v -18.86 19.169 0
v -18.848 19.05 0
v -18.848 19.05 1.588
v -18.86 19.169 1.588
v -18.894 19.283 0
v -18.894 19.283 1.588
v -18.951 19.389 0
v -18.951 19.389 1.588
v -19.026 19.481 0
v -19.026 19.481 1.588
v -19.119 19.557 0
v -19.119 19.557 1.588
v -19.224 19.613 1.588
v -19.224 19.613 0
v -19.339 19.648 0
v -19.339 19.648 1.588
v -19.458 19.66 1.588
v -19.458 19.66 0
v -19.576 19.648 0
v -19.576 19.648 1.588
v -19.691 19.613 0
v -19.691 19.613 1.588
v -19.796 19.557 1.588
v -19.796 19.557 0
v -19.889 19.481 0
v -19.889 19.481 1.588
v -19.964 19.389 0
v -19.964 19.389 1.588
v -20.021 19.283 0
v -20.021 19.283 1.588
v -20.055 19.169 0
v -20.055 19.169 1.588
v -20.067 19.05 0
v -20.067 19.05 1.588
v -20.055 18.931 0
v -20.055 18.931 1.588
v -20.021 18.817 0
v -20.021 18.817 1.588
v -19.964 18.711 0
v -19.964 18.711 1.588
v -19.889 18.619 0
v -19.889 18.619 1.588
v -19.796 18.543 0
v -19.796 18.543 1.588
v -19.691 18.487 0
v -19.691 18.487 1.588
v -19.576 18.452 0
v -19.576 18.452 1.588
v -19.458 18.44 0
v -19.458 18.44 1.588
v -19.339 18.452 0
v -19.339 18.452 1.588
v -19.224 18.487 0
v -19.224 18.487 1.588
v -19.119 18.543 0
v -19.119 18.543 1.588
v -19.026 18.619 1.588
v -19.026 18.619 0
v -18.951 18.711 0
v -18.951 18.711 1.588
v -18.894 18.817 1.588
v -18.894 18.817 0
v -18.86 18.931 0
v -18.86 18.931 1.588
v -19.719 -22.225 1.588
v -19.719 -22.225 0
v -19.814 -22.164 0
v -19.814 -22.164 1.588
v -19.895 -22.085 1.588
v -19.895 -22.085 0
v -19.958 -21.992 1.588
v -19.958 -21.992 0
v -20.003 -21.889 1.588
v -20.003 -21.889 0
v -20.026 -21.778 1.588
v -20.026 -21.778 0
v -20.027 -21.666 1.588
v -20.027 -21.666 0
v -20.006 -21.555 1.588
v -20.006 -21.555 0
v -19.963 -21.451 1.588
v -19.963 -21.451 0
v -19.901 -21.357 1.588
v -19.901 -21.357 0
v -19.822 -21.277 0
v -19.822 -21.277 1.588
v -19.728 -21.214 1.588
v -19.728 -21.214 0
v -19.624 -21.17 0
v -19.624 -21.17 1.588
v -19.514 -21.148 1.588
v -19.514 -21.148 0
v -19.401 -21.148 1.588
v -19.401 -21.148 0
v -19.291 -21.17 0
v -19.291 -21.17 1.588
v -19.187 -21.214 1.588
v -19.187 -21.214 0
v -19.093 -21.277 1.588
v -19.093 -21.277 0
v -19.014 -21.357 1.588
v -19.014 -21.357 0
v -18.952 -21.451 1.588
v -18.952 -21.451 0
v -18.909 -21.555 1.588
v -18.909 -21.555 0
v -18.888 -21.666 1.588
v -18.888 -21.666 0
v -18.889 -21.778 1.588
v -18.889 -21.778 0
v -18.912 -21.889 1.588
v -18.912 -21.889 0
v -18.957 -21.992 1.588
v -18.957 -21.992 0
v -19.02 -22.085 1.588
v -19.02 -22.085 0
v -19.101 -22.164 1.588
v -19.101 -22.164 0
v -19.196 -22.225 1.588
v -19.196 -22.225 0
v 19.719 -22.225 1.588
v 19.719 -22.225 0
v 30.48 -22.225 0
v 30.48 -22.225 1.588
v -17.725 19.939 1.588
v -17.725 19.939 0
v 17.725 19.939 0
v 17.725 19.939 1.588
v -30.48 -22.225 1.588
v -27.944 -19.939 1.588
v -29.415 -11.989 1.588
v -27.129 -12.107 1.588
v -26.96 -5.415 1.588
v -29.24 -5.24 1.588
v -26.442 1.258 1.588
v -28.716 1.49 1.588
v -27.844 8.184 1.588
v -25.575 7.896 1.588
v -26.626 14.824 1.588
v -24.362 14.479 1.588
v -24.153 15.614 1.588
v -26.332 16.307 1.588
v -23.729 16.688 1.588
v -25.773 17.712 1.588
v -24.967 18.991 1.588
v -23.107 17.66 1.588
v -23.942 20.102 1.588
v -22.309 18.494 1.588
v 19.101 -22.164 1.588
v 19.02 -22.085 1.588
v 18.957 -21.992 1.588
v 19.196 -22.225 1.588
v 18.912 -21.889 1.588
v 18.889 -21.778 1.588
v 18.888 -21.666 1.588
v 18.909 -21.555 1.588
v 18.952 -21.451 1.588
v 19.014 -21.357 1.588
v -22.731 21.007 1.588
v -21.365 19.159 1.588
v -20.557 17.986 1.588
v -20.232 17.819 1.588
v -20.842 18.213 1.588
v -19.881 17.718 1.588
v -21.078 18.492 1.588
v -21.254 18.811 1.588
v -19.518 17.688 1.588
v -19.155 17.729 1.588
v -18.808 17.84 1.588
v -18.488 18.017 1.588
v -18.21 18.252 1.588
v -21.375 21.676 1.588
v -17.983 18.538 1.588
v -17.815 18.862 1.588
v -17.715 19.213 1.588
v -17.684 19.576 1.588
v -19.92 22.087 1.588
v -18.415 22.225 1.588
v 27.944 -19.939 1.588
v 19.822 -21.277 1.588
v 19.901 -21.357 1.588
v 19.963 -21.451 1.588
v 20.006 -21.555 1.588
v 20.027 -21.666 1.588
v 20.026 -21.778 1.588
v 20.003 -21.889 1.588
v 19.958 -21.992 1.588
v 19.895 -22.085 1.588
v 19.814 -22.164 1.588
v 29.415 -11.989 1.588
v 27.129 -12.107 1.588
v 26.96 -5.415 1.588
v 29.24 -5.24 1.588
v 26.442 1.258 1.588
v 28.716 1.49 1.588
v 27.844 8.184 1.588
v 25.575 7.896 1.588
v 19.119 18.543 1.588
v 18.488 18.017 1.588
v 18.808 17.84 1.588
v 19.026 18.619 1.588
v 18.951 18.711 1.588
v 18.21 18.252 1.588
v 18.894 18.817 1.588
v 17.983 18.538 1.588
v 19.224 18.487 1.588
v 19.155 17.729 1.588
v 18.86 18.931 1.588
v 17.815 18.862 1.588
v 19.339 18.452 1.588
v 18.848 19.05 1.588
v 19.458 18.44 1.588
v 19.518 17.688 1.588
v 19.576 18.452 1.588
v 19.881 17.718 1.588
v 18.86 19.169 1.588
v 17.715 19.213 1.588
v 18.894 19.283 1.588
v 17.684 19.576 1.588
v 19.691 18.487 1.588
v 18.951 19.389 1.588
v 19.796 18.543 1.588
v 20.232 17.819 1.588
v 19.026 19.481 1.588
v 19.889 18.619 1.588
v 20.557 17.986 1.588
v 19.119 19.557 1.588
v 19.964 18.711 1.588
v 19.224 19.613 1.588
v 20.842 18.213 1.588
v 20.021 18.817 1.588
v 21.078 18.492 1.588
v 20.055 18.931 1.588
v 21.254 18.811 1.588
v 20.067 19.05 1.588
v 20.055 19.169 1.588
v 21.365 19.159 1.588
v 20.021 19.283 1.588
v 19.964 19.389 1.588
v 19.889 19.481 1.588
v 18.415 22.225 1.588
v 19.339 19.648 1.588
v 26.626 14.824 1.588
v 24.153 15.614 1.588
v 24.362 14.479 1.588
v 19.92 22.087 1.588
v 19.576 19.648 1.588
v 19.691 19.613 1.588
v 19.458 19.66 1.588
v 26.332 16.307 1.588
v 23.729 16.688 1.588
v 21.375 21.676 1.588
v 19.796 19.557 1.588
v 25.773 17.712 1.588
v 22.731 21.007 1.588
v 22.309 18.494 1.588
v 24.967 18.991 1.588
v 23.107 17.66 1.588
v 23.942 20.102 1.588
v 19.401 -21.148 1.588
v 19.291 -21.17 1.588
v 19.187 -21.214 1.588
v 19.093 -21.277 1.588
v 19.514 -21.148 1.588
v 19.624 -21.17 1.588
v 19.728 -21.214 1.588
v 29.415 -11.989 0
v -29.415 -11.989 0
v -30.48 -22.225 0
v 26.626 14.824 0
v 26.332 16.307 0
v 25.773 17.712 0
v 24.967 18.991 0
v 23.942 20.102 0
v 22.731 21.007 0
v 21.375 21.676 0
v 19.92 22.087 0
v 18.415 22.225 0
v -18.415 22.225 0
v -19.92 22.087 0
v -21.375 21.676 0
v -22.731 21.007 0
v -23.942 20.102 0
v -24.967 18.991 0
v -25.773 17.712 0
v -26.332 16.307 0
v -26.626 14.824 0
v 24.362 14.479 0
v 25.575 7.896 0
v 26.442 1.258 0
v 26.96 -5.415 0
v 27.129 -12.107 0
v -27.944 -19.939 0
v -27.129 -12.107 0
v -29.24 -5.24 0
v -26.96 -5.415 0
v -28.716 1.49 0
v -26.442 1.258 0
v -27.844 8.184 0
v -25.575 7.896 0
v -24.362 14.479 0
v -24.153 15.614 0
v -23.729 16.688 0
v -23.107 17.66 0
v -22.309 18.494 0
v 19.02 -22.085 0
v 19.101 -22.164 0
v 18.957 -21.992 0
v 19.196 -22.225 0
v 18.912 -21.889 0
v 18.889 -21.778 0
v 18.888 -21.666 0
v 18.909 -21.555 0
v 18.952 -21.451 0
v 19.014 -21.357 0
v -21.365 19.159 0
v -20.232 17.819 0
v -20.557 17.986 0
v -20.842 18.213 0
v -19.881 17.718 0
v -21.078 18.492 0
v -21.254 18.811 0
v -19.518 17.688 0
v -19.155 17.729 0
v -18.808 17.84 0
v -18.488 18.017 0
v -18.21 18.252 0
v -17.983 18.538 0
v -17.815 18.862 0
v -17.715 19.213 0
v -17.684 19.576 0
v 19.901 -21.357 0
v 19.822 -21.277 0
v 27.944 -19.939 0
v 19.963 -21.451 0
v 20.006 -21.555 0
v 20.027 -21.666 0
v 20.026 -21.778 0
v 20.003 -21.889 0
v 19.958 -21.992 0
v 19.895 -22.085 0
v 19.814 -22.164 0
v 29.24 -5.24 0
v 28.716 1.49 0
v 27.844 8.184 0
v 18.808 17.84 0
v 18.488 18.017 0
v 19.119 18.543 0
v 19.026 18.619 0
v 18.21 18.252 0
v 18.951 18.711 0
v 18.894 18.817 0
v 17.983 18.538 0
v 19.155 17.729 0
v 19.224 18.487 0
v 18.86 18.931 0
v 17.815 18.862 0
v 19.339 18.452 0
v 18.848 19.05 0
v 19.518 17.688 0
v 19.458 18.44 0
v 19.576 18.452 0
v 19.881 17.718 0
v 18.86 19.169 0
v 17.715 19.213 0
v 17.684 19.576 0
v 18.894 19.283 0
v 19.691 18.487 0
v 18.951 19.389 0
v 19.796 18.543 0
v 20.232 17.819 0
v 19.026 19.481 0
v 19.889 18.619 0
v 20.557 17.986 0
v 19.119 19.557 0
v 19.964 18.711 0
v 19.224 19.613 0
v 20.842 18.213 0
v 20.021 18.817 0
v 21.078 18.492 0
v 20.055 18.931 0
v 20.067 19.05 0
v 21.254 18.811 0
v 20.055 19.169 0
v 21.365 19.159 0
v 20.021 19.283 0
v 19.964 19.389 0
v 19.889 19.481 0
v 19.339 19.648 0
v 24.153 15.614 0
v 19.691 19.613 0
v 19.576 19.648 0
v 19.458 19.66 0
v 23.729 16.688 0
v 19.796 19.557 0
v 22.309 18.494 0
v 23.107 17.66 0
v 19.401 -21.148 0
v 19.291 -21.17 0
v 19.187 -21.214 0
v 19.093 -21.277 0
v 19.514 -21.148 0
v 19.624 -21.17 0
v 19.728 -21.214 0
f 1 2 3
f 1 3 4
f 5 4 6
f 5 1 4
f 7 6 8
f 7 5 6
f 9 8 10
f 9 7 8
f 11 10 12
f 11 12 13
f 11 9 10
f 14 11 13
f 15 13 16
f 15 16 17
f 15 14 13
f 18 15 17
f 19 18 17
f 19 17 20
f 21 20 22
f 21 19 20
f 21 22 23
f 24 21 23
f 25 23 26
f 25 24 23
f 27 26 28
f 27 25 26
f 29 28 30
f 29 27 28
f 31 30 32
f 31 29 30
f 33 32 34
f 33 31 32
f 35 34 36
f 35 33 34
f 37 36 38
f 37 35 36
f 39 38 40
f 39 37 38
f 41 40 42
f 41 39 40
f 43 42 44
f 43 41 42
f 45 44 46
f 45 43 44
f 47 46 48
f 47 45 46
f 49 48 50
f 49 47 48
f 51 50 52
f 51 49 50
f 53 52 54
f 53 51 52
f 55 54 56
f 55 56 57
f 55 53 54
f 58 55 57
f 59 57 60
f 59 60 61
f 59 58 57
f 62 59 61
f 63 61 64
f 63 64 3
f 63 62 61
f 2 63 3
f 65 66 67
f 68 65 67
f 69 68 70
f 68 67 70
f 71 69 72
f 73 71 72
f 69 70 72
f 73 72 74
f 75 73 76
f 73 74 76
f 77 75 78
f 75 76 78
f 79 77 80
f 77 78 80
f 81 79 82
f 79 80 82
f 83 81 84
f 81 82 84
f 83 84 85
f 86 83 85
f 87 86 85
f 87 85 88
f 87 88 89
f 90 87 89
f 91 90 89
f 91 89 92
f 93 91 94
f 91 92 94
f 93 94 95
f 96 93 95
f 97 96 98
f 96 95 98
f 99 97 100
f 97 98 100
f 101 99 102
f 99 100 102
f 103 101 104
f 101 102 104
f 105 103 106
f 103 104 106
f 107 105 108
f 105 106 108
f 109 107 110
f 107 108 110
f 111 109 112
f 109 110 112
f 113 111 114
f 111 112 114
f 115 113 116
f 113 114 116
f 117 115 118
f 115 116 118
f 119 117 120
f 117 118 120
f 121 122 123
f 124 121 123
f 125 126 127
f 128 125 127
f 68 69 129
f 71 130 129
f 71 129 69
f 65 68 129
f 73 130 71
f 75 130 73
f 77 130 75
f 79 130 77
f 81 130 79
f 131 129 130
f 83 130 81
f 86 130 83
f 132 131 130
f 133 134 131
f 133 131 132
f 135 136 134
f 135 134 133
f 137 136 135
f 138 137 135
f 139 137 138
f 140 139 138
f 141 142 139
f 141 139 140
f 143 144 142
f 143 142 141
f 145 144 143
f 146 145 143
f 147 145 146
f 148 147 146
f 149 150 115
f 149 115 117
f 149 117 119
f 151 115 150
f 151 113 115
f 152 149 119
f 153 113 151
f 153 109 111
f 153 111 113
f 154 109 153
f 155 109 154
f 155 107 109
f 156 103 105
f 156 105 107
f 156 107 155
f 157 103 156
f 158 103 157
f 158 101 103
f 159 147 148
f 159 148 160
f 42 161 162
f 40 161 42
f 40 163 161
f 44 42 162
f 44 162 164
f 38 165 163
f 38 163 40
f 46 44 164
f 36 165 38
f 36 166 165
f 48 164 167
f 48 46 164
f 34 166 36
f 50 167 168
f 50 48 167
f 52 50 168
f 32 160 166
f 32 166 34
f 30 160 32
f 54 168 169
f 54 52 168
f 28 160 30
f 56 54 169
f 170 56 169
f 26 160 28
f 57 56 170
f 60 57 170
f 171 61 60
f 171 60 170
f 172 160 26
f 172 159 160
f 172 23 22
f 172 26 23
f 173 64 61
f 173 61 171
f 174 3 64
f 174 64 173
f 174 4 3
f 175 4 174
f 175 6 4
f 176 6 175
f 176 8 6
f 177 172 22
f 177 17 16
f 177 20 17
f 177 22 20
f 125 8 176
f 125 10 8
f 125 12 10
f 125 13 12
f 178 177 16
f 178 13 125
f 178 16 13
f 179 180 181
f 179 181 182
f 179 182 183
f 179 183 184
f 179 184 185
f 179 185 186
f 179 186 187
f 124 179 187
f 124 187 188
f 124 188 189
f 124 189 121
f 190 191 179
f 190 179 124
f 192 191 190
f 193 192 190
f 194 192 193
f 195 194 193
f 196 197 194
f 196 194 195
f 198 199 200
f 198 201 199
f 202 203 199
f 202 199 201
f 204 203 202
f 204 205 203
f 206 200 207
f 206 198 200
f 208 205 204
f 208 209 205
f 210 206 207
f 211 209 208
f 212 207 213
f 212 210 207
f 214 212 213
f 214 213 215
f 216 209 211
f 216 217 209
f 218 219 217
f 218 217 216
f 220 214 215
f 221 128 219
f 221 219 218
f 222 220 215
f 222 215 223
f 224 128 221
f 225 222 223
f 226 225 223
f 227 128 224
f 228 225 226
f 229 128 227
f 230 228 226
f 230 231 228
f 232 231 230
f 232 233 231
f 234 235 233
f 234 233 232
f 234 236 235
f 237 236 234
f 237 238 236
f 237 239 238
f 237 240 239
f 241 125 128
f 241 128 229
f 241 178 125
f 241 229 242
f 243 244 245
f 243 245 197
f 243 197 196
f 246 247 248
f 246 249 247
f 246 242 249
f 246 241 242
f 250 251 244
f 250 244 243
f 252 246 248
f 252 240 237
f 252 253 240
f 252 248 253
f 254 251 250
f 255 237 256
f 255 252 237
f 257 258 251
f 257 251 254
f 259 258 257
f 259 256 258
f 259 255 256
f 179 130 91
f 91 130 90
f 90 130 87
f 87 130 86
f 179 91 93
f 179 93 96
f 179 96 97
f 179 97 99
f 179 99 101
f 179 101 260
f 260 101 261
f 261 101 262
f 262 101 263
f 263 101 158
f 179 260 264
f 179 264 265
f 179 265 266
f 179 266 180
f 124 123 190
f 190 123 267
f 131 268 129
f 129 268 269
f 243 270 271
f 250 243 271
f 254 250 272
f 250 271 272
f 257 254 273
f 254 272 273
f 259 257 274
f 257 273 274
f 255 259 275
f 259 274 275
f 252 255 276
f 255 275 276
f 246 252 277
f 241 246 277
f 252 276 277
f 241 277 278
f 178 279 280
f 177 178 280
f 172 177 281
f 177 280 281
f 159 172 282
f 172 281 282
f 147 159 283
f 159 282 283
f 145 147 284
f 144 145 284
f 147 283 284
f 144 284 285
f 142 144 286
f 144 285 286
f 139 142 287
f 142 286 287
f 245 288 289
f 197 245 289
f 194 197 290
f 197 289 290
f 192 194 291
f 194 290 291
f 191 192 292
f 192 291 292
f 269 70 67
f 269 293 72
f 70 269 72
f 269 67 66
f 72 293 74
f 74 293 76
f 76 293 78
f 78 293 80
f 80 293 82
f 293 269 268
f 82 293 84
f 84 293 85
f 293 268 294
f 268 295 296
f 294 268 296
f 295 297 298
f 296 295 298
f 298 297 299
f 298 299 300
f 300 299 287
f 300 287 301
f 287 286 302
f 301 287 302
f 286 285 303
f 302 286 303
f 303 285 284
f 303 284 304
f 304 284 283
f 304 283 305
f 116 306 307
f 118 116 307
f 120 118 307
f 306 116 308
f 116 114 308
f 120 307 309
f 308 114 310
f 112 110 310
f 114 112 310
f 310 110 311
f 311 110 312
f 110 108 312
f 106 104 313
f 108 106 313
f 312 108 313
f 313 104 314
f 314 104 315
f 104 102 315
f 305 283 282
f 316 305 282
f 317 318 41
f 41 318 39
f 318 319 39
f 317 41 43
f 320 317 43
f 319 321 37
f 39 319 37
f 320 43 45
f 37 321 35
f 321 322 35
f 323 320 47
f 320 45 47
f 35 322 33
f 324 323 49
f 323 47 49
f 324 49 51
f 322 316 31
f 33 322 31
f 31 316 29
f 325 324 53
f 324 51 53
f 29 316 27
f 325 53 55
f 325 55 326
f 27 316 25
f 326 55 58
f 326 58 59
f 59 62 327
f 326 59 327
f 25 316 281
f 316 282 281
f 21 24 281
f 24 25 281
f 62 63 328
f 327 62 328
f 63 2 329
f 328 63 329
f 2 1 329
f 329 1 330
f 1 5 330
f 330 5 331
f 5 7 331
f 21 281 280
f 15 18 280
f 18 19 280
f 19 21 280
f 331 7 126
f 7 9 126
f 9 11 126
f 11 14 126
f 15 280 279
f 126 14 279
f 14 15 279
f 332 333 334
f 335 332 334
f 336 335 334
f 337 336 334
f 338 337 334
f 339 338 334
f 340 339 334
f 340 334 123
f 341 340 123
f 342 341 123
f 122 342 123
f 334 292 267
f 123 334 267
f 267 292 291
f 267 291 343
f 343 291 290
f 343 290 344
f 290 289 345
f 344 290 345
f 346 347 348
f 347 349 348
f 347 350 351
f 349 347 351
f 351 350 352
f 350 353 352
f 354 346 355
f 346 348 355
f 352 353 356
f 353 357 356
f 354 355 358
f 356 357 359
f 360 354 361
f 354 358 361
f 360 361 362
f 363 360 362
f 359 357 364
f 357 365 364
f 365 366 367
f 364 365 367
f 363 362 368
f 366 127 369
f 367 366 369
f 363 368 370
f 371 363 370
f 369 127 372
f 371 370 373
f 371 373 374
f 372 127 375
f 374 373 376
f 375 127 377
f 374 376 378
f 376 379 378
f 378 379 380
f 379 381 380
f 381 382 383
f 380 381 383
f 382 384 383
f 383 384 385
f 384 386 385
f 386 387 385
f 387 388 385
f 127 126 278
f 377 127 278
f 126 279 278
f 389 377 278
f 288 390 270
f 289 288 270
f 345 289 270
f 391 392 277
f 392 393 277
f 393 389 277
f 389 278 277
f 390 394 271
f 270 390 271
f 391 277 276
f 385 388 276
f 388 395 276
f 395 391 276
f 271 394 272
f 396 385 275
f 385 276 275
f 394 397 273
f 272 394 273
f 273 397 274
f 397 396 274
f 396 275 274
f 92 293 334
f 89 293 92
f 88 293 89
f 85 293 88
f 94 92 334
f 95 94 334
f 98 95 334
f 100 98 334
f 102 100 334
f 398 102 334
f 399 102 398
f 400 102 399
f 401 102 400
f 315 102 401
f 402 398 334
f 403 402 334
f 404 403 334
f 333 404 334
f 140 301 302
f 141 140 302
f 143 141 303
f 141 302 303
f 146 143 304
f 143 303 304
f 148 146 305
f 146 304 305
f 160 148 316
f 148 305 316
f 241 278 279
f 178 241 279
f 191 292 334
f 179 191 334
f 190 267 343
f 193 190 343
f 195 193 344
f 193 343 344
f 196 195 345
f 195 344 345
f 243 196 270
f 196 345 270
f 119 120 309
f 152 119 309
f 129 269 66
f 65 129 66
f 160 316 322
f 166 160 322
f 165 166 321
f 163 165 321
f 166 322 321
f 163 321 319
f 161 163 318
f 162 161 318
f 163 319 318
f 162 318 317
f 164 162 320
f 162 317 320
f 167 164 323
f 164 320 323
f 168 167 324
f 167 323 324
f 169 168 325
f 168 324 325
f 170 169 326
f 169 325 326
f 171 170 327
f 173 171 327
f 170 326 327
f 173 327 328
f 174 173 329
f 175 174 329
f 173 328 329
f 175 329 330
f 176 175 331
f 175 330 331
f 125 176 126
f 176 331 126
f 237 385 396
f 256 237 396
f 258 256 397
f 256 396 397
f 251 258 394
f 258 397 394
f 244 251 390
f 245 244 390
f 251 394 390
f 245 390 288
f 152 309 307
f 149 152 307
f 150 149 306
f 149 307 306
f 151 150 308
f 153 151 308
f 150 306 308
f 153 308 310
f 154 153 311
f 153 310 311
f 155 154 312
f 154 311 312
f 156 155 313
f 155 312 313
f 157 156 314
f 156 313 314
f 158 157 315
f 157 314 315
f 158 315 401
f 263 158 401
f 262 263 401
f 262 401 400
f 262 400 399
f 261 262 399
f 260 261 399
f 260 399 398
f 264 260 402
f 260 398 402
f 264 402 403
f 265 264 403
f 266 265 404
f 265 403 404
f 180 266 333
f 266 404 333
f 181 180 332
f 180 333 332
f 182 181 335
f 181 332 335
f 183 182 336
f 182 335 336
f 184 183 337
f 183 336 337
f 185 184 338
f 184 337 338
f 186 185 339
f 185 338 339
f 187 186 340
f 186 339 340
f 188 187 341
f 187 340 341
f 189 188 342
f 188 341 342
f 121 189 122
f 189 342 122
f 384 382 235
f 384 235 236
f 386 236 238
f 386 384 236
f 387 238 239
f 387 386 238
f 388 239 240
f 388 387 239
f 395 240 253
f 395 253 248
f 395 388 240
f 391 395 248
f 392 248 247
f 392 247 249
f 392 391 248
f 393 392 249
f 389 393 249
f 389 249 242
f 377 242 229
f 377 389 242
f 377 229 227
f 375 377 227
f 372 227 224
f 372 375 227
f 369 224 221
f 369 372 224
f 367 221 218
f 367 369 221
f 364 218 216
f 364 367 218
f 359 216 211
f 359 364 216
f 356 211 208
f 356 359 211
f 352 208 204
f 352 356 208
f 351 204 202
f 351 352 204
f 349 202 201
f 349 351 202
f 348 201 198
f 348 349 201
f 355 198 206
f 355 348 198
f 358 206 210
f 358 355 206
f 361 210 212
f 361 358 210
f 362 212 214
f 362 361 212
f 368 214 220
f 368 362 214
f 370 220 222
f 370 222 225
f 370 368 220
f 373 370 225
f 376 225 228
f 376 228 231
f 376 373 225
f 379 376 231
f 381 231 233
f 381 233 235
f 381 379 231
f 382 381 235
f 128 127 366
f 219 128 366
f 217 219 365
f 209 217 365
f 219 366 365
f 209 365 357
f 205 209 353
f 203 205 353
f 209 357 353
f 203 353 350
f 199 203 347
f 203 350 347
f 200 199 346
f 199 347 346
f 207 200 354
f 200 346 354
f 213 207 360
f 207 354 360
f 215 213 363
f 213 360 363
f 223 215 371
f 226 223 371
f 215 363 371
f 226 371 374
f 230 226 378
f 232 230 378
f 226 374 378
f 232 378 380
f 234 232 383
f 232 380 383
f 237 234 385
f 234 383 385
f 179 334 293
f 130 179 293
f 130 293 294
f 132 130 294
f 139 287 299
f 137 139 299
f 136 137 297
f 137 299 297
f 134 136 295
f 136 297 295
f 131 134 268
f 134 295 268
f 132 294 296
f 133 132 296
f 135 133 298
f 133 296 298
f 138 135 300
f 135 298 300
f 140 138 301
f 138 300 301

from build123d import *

# Parameters (mm, degrees)
SKETCH1_R           = 0.6096
BOSS_EXTRUDE1_DEPTH = 1.5875


with BuildPart() as part:
    # Sketch1 → Boss-Extrude1 (new body)
    with BuildSketch(Plane.XY):
        with BuildLine():
            Line((30.48, -22.225), (29.415104476, -11.9888))
            ThreePointArc((29.415104476, -11.9888), (28.715873825, 1.490040556), (26.625688573, 14.824176893))
            ThreePointArc((26.625688573, 14.824176893), (23.941924767, 20.101731209), (18.415, 22.225))
            Line((18.415, 22.225), (-18.415, 22.225))
            ThreePointArc((-18.415, 22.225), (-23.941924767, 20.101731209), (-26.625688573, 14.824176893))
            ThreePointArc((-26.625688573, 14.824176893), (-28.715873825, 1.490040556), (-29.415104476, -11.9888))
            Line((-29.415104476, -11.9888), (-30.48, -22.225))
            Line((-30.48, -22.225), (-19.719346062, -22.225))
            ThreePointArc((-19.719346062, -22.225), (-19.457528855, -21.1455), (-19.195711648, -22.225))
            Line((-19.195711648, -22.225), (19.195711648, -22.225))
            ThreePointArc((19.195711648, -22.225), (19.457528855, -21.1455), (19.719346062, -22.225))
            Line((19.719346062, -22.225), (30.48, -22.225))
        make_face()
        with BuildLine():
            ThreePointArc((17.725268352, 19.939), (19.155271645, 17.728799653), (21.365471992, 19.158802947))
            ThreePointArc((21.365471992, 19.158802947), (23.441797038, 17.188737724), (24.362294321, 14.478577686))
            ThreePointArc((24.362294321, 14.478577686), (26.441646573, 1.258286409), (27.129050016, -12.106865432))
            Line((27.129050016, -12.106865432), (27.943845061, -19.939))
            Line((27.943845061, -19.939), (-27.943845061, -19.939))
            Line((-27.943845061, -19.939), (-27.129050016, -12.106865432))
            ThreePointArc((-27.129050016, -12.106865432), (-26.441646573, 1.258286409), (-24.362294321, 14.478577686))
            ThreePointArc((-24.362294321, 14.478577686), (-23.441797038, 17.188737724), (-21.365471992, 19.158802947))
            ThreePointArc((-21.365471992, 19.158802947), (-19.155271645, 17.728799653), (-17.725268352, 19.939))
            Line((-17.725268352, 19.939), (17.725268352, 19.939))
        make_face(mode=Mode.SUBTRACT)
        with Locations((19.457528855, 19.05)):
            Circle(SKETCH1_R, mode=Mode.SUBTRACT)
        with Locations((-19.457528855, 19.05)):
            Circle(SKETCH1_R, mode=Mode.SUBTRACT)
    extrude(amount=BOSS_EXTRUDE1_DEPTH)


solid = part.part
